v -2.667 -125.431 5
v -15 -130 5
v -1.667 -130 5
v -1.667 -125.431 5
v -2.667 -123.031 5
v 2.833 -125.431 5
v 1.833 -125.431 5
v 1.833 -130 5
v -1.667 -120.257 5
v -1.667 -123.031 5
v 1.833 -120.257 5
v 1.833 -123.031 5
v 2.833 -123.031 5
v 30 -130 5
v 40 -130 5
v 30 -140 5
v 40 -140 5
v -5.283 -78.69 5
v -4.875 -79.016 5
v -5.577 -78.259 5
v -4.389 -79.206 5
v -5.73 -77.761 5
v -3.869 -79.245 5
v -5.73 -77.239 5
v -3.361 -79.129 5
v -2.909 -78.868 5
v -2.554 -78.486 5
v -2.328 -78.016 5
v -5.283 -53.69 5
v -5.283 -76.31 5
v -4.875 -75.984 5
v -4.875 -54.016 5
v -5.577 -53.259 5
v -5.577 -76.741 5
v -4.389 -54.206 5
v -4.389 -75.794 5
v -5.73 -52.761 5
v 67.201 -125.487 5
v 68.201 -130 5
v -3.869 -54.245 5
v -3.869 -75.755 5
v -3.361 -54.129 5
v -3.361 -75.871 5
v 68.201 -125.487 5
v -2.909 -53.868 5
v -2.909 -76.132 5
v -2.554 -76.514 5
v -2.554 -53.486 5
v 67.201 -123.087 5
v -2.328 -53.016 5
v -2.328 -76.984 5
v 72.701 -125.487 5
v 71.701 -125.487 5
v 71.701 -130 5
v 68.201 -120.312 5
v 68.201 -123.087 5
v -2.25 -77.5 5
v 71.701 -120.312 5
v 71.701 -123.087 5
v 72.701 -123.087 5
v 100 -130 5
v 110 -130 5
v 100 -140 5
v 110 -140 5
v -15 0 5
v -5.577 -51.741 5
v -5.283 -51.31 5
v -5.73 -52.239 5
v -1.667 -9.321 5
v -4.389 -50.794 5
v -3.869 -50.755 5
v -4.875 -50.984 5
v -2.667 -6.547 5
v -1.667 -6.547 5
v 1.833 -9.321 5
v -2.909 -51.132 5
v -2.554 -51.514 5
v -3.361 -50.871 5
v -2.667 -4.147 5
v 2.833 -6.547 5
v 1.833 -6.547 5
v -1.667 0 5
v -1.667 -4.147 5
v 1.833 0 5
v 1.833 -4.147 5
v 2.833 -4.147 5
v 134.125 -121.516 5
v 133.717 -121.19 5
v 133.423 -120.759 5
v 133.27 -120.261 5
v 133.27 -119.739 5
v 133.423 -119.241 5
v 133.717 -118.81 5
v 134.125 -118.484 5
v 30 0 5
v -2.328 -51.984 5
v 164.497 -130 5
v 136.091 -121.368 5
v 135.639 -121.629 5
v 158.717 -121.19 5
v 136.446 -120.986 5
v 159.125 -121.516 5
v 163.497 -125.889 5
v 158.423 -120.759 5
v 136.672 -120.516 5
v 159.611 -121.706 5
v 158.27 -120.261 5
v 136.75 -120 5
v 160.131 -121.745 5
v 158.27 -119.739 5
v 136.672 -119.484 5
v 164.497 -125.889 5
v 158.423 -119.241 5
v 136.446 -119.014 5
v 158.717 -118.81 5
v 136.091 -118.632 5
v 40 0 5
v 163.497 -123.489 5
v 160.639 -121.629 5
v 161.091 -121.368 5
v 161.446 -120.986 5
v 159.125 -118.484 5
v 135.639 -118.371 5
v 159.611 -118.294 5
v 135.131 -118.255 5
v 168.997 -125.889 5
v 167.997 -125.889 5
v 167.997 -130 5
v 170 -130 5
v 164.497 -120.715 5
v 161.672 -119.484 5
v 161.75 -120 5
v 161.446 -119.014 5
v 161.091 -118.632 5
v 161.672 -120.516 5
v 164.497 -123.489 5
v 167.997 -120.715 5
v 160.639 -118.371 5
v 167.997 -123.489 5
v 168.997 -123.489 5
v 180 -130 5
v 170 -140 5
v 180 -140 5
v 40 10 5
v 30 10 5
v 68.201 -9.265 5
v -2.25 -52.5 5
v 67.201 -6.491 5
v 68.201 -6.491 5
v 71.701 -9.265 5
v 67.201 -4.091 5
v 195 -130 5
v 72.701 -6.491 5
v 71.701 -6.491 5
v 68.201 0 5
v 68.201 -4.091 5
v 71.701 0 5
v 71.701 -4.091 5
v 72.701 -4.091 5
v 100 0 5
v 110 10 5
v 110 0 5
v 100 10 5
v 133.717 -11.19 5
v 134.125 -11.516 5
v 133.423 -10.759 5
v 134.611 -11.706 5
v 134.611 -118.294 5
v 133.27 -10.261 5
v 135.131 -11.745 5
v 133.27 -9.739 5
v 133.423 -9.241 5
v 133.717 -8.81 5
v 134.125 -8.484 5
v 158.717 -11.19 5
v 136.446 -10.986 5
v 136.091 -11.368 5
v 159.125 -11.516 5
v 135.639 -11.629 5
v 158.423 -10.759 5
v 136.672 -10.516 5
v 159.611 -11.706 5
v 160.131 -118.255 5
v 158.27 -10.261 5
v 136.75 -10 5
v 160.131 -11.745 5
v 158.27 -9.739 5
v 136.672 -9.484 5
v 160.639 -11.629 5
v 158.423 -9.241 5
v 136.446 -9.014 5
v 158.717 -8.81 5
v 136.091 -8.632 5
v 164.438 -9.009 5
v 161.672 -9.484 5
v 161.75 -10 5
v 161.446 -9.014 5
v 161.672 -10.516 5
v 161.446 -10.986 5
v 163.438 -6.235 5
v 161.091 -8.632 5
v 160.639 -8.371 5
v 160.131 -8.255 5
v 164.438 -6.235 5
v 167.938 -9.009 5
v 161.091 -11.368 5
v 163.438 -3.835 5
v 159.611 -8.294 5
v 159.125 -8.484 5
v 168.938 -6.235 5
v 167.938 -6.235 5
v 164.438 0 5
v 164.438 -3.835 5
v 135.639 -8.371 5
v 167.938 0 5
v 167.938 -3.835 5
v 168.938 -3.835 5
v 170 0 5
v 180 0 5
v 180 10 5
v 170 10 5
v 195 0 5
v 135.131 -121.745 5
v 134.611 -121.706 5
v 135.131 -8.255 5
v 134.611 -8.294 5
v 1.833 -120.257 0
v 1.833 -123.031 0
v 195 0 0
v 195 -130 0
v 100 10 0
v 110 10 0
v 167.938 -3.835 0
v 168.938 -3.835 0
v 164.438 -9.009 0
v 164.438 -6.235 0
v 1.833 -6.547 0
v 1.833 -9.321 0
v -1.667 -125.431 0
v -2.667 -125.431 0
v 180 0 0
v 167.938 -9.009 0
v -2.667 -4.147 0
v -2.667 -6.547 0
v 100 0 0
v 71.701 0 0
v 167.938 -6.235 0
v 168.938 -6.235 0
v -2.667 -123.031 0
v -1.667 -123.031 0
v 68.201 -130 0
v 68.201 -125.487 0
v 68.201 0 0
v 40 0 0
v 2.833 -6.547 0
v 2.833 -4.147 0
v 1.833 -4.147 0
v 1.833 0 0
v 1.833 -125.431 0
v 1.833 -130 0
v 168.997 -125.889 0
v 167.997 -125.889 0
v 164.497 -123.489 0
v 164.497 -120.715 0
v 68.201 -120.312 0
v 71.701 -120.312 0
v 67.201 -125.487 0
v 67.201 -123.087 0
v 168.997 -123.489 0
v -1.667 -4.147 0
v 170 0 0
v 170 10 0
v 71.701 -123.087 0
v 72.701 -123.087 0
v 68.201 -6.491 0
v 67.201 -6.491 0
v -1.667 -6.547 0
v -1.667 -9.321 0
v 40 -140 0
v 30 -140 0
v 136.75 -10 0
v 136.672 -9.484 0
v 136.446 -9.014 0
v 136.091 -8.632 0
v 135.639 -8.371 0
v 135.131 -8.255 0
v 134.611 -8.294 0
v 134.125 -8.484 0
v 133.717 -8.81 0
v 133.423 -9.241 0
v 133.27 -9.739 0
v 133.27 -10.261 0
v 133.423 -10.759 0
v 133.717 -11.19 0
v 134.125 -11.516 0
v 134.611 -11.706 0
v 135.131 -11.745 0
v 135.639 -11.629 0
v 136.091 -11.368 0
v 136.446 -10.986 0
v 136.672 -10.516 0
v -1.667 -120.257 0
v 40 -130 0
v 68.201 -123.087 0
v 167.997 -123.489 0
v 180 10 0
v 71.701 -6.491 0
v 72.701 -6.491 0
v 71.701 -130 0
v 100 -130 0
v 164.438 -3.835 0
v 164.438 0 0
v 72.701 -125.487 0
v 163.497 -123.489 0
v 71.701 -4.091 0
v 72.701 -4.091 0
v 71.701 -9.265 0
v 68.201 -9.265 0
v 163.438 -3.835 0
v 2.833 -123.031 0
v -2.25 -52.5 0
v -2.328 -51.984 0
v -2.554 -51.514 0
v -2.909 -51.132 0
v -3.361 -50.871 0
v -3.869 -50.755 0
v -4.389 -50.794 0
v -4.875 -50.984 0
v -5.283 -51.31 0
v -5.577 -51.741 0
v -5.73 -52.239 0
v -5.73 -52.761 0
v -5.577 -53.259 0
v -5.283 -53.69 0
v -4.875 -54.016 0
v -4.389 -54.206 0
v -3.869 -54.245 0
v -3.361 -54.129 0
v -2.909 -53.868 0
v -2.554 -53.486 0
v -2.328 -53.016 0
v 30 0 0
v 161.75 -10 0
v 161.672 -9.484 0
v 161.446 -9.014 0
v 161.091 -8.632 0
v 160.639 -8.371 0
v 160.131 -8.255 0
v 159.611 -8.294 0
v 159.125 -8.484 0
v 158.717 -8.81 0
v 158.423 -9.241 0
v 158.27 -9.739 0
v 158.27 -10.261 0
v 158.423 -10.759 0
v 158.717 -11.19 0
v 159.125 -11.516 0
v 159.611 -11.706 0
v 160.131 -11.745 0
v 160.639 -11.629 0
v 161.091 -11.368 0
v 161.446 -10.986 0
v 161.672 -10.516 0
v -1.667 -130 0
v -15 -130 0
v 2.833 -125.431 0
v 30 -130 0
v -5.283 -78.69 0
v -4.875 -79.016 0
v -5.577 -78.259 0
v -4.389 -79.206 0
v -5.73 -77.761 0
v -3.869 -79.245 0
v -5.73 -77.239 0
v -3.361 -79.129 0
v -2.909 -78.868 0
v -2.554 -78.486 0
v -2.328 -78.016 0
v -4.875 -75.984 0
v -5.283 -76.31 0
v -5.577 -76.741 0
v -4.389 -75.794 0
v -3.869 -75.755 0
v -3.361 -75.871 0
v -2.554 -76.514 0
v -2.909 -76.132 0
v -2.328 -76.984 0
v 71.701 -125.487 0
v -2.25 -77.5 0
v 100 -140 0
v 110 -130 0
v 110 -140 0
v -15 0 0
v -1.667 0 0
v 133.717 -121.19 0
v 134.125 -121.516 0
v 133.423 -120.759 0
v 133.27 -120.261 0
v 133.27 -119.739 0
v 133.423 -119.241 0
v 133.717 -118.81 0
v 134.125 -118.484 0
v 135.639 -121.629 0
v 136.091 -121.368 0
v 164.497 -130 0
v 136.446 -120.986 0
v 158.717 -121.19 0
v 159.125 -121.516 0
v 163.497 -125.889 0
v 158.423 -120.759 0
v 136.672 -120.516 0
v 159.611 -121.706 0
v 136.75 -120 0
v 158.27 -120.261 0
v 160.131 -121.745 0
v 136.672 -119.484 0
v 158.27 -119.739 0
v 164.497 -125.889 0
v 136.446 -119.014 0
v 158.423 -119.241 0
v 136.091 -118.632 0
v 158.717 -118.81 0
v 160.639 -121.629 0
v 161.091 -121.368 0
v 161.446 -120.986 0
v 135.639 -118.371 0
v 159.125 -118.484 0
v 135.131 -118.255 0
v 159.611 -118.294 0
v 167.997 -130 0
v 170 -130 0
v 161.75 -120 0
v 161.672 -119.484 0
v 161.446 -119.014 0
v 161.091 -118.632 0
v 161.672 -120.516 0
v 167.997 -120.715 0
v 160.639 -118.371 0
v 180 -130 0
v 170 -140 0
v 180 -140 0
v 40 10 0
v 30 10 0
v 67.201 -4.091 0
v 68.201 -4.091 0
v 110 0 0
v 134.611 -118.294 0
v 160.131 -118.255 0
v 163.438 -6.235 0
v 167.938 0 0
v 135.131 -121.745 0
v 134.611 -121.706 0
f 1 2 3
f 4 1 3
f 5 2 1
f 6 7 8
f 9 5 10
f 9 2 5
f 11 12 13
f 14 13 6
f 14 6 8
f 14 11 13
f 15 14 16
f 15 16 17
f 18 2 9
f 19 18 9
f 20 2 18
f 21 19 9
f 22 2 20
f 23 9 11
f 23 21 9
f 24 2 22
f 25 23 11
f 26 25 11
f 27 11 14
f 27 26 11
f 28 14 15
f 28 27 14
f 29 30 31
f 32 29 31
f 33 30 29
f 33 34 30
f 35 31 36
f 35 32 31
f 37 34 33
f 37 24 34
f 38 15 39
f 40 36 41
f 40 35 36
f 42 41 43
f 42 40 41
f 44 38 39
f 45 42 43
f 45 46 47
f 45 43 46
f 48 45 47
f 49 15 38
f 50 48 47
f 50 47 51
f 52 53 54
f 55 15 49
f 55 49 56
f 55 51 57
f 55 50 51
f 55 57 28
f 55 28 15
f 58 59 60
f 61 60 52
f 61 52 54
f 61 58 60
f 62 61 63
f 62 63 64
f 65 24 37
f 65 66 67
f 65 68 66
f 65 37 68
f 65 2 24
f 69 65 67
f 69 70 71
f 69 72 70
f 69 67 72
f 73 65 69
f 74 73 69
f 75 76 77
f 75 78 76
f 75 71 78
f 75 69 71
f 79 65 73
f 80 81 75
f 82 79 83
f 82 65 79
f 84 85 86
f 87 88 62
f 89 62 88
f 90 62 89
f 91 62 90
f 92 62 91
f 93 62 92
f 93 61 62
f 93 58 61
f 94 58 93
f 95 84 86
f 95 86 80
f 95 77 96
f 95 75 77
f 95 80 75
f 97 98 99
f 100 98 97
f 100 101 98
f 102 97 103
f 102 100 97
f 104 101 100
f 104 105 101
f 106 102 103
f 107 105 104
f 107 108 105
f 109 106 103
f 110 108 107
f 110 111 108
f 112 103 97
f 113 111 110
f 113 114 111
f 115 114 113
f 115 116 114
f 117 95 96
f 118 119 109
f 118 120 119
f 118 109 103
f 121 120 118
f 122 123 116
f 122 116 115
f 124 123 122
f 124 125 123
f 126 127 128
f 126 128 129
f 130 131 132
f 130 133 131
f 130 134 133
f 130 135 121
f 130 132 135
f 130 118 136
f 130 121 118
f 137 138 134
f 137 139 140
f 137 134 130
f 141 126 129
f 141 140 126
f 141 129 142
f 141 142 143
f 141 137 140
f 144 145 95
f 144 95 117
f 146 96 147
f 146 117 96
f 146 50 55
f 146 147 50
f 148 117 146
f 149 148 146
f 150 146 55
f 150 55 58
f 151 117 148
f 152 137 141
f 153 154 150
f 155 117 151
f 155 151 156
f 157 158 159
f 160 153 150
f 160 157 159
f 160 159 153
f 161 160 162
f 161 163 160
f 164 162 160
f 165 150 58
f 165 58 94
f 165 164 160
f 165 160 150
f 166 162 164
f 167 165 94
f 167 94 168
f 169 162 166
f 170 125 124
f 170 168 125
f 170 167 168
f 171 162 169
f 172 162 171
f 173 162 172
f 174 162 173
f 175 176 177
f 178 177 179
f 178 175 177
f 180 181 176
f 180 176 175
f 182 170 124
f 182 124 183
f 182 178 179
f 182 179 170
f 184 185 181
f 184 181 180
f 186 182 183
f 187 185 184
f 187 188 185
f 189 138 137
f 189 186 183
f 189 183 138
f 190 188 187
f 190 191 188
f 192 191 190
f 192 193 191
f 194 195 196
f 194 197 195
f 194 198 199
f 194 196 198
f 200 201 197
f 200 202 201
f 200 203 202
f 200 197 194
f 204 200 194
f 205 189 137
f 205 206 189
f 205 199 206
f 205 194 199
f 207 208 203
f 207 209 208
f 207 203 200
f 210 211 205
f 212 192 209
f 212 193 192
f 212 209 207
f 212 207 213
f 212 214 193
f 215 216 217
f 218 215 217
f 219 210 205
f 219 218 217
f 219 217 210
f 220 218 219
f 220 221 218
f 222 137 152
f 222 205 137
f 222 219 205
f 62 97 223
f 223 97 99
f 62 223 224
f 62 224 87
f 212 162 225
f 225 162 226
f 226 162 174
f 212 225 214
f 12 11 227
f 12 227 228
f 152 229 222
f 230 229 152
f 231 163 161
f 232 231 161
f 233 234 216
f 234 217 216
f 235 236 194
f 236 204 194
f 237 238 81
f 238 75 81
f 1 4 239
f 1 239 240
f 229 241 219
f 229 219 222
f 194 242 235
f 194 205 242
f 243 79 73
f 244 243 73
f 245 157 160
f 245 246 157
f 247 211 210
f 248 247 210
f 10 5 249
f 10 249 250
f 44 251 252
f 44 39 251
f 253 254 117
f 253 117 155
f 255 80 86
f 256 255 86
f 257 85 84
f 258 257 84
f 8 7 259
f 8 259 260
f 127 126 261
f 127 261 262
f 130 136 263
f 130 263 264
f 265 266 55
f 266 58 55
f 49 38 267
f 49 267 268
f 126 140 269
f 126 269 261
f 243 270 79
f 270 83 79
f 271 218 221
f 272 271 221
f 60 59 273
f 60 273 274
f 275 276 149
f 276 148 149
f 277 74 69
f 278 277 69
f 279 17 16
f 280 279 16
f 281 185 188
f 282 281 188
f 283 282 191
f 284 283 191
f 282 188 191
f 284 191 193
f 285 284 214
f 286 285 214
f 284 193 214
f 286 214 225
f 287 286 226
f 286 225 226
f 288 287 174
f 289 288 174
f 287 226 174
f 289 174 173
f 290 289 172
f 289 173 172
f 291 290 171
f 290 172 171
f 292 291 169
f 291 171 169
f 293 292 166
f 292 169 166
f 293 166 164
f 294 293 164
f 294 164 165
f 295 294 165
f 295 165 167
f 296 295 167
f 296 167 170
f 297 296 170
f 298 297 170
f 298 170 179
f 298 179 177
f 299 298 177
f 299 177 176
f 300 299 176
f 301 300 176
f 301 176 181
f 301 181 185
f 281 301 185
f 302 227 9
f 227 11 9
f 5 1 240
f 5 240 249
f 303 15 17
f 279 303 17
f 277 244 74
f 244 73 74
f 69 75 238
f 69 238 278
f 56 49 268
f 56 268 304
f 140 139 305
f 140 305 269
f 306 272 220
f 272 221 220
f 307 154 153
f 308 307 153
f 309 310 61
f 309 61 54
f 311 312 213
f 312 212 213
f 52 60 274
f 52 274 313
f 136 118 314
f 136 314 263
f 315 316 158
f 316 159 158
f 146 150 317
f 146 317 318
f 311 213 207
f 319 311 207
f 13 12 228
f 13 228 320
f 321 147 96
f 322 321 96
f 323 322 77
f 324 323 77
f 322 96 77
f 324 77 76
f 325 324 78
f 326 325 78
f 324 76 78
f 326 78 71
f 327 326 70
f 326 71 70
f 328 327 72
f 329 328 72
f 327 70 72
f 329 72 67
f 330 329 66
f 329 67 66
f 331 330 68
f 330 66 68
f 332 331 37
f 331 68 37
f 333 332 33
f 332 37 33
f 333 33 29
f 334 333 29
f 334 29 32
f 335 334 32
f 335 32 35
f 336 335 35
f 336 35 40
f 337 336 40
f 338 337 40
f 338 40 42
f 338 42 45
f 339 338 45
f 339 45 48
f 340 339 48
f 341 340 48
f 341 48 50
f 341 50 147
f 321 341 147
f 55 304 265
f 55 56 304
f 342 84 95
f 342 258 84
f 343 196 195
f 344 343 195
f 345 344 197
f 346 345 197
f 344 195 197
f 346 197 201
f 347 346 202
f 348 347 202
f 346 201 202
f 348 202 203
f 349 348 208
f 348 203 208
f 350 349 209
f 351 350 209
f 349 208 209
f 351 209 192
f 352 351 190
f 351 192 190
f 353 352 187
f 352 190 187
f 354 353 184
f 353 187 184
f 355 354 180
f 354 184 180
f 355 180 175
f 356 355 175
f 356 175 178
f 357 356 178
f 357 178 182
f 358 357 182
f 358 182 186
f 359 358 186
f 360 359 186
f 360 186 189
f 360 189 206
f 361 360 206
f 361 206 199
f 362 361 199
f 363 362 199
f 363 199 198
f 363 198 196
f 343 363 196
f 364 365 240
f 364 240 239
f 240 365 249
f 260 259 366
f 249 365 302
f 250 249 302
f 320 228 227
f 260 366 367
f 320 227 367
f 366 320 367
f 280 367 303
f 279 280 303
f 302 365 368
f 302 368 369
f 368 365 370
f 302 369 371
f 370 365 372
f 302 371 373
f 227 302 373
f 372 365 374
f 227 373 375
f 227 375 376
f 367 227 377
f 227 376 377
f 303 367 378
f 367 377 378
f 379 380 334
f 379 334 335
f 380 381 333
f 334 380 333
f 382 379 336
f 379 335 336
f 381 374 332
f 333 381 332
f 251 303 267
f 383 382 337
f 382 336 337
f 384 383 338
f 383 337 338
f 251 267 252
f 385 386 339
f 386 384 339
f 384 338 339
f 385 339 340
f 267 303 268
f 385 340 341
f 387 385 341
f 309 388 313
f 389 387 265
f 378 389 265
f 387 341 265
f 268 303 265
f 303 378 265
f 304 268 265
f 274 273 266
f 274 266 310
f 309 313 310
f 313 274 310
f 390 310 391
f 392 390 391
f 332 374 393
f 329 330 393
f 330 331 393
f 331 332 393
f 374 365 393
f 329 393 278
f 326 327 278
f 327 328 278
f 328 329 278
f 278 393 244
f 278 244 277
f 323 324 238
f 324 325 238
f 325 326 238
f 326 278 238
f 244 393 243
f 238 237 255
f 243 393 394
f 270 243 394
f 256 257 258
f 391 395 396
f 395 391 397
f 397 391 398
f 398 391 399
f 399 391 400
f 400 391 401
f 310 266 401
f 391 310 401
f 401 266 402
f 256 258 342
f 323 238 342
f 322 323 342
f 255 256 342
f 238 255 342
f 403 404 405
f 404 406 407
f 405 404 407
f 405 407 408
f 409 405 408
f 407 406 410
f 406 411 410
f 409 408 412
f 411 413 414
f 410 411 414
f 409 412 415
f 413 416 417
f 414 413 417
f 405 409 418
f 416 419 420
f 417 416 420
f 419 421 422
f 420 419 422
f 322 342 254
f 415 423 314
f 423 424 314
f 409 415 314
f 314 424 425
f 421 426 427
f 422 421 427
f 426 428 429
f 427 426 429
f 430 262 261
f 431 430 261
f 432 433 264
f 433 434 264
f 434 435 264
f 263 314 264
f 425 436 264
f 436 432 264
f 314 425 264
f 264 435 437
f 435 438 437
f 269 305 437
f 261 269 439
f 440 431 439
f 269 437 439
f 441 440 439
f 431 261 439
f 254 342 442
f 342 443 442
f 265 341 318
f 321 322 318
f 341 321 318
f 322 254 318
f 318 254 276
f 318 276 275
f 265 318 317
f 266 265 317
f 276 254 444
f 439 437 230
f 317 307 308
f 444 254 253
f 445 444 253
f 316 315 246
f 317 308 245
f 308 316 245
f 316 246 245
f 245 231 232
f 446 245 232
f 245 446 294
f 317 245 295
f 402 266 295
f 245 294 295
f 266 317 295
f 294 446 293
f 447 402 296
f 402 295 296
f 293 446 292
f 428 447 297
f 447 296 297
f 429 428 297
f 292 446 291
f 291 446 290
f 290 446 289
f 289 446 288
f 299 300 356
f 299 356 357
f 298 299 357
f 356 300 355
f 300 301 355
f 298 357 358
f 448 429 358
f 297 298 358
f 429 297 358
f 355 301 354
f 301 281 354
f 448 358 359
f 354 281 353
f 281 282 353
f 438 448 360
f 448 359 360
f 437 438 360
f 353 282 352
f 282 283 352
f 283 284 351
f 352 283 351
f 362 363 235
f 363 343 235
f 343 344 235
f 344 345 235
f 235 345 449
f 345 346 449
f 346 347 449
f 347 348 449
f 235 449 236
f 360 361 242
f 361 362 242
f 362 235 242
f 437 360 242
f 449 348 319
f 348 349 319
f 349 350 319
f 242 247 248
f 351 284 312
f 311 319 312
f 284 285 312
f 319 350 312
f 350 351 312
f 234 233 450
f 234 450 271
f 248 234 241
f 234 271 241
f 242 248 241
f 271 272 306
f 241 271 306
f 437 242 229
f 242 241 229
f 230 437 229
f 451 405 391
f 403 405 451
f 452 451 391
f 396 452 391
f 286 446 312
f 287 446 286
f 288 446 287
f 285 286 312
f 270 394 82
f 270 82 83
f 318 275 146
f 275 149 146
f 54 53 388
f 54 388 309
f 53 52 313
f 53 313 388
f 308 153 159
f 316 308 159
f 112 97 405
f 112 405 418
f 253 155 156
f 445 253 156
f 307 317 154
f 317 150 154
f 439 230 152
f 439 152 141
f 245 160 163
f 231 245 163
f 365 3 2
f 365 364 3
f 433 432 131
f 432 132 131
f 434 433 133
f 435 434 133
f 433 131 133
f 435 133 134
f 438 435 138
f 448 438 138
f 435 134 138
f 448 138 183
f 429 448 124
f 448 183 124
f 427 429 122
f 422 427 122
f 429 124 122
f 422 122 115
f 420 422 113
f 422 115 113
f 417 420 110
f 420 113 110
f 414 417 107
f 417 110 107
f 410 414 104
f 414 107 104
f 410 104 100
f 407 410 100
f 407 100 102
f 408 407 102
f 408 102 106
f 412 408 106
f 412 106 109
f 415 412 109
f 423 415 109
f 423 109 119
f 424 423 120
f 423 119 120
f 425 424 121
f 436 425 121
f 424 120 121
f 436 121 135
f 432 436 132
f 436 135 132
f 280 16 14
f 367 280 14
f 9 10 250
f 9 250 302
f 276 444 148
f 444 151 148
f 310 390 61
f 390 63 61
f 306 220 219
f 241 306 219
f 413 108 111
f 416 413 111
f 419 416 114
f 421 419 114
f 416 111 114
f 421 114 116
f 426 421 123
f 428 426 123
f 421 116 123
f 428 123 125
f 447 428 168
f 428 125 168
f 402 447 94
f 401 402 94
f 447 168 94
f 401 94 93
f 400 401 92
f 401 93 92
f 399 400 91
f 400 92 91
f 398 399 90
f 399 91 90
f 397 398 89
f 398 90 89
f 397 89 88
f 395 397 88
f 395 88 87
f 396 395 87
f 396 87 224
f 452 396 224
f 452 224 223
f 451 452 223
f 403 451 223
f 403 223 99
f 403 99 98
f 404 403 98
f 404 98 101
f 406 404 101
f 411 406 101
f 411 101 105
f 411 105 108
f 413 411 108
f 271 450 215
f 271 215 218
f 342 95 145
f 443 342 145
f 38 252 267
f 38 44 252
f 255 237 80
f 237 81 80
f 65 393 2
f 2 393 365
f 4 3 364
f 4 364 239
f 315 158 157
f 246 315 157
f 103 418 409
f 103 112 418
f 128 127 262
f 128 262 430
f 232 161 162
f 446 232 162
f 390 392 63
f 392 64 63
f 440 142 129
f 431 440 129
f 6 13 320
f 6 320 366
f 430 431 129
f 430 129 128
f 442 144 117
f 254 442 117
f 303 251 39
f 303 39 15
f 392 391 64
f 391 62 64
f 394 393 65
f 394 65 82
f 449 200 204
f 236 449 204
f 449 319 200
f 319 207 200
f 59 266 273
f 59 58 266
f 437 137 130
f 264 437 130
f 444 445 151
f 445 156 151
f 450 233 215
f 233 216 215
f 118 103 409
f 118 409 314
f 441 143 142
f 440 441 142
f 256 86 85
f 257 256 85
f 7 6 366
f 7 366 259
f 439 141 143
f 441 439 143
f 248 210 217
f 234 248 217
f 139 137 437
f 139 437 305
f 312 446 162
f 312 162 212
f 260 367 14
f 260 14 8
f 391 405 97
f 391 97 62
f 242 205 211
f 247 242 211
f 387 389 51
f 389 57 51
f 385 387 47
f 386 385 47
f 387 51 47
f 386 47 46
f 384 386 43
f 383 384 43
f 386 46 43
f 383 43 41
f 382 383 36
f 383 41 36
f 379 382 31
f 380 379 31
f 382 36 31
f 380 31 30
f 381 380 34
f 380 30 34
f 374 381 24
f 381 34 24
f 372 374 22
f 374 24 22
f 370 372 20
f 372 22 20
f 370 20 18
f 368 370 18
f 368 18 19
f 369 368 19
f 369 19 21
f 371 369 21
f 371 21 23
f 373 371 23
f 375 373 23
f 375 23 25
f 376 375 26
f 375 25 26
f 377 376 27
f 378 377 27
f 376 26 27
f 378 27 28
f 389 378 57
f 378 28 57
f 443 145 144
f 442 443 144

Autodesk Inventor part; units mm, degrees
ref_plane "YZ Plane" through (0, 0, 0) normal (1, 0, 0) x (0, 1, 0)
ref_plane "XZ Plane" through (0, 0, 0) normal (0, 1, 0) x (-1, 0, 0)
ref_plane "XY Plane" through (0, 0, 0) normal (0, 0, 1) x (1, 0, 0)
sketch "Boceto1" plane through (0, 0, 0) normal (0, 0, 1) x (1, 0, 0)
  line L0 (0, 0) -> (195, 0)
  line L1 (195, 0) -> (195, -130)
  line L2 (195, -130) -> (0, -130)
  line L3 (-15, 0) -> (-15, -130)
  line L4 (0, -130) -> (-15, -130)
  line L5 (0, 0) -> (-15, 0)
  dimension "d1" = 130
extrude "Extrusión1" add sketch "Boceto1" along normal blind 5
sketch "Boceto2" plane through (0, 0, 5) normal (0, 0, 1) x (1, 0, 0)
  line L0 (-15, 0) -> (195, 0) projected
  line L1 (195, -130) -> (-15, -130) projected
  line L2 (30, 0) -> (40, 0)
  line L3 (100, 0) -> (110, 0)
  line L4 (170, 0) -> (180, 0)
  line L5 (170, -130) -> (180, -130)
  line L6 (100, -130) -> (110, -130)
  line L7 (30, -130) -> (40, -130)
  line L8 (40, 5) -> (40, 0)
  line L9 (40, -130) -> (40, -135)
  line L10 (30, -135) -> (30, -130)
  line L11 (30, 0) -> (30, 5)
  line L12 (110, 5) -> (110, 0)
  line L13 (110, -130) -> (110, -135)
  line L14 (100, -135) -> (100, -130)
  line L15 (100, 0) -> (100, 5)
  line L16 (180, 5) -> (180, 0)
  line L17 (180, -130) -> (180, -135)
  line L18 (170, -135) -> (170, -130)
  line L19 (170, 0) -> (170, 5)
  line L20 (30, 5) -> (30, 10)
  line L21 (40, 10) -> (40, 5)
  line L22 (100, 5) -> (100, 10)
  line L23 (110, 10) -> (110, 5)
  line L24 (170, 5) -> (170, 10)
  line L25 (180, 10) -> (180, 5)
  line L26 (40, -135) -> (40, -140)
  line L27 (30, -140) -> (30, -135)
  line L28 (110, -135) -> (110, -140)
  line L29 (100, -140) -> (100, -135)
  line L30 (180, -135) -> (180, -140)
  line L31 (170, -140) -> (170, -135)
  line L32 (170, 10) -> (180, 10)
  line L33 (30, 10) -> (40, 10)
  line L34 (100, 10) -> (110, 10)
  line L35 (180, -140) -> (170, -140)
  line L36 (110, -140) -> (100, -140)
  line L37 (40, -140) -> (30, -140)
extrude "Extrusión2" add sketch "Boceto2" against normal blind 5
sketch "Boceto3" plane through (0, 0, 5) normal (0, 0, 1) x (1, 0, 0)
  line L0 (195, 0) -> (195, -130) projected
  line L1 (180, 0) -> (195, 0) projected
  line L2 (-15, -130) -> (-15, 0) projected
  circle A0 centre (135, -120) radius 1.75
  circle A1 centre (160, -120) radius 1.75
  circle A2 centre (135, -10) radius 1.75
  circle A3 centre (160, -10) radius 1.75
  circle A4 centre (-4, -52.5) radius 1.75
  circle A5 centre (-4, -77.5) radius 1.75
  point P0 (30, 0)
  point P1 (30, -130)
  point P2 (0, 0)
  dimension "d20" = 3.5
  dimension "d21" = 3.5
  dimension "d22" = 3.5
  dimension "d23" = 3.5
  dimension "d24" = 3.5
  dimension "d25" = 3.5
  dimension "d26" = 25
  dimension "d27" = 25
  dimension "d28" = 25
  dimension "d29" = 10
  dimension "d30" = 10
  dimension "d31" = 150
  dimension "d32" = 150
  dimension "d33" = 52.5
  dimension "d34" = 199
extrude "Extrusión3" cut sketch "Boceto3" against normal blind 10
sketch "Boceto4" plane through (0, 0, 5) normal (0, 0, 1) x (1, 0, 0)
  line L0 (-1.6674, -130.3426) -> (-1.6674, -125.4313)
  line L1 (1.8326, -130.3426) -> (-1.6674, -130.3426)
  line L2 (1.8326, -125.4313) -> (1.8326, -130.3426)
  line L3 (-1.6674, -125.4313) -> (-2.6674, -125.4313)
  line L4 (-2.6674, -123.0313) -> (-1.6674, -123.0313)
  line L5 (-1.6674, -123.0313) -> (-1.6674, -120.2573)
  line L6 (1.8326, -120.2573) -> (1.8326, -123.0313)
  line L7 (2.8326, -125.4313) -> (1.8326, -125.4313)
  line L8 (2.8326, -123.0313) -> (2.8326, -125.4313)
  line L9 (1.8326, -123.0313) -> (2.8326, -123.0313)
  line L10 (1.8326, -120.2573) -> (-1.6674, -120.2573)
  line L11 (-2.6674, -125.4313) -> (-2.6674, -123.0313)
  line L12 (167.9972, -120.715) -> (164.4972, -120.715)
  line L13 (167.9972, -120.715) -> (167.9972, -123.4891)
  line L14 (164.4972, -123.4891) -> (164.4972, -120.715)
  line L15 (167.9972, -123.4891) -> (168.9972, -123.4891)
  line L16 (168.9972, -123.4891) -> (168.9972, -125.8891)
  line L17 (163.4972, -125.8891) -> (163.4972, -123.4891)
  line L18 (164.4972, -125.8891) -> (163.4972, -125.8891)
  line L19 (168.9972, -125.8891) -> (167.9972, -125.8891)
  line L20 (163.4972, -123.4891) -> (164.4972, -123.4891)
  line L21 (164.4972, -130.8004) -> (164.4972, -125.8891)
  line L22 (167.9972, -130.8004) -> (164.4972, -130.8004)
  line L23 (167.9972, -125.8891) -> (167.9972, -130.8004)
  line L24 (71.7006, -120.3125) -> (68.2006, -120.3125)
  line L25 (71.7006, -120.3125) -> (71.7006, -123.0866)
  line L26 (68.2006, -123.0866) -> (68.2006, -120.3125)
  line L27 (71.7006, -123.0866) -> (72.7006, -123.0866)
  line L28 (72.7006, -123.0866) -> (72.7006, -125.4866)
  line L29 (67.2006, -125.4866) -> (67.2006, -123.0866)
  line L30 (68.2006, -125.4866) -> (67.2006, -125.4866)
  line L31 (72.7006, -125.4866) -> (71.7006, -125.4866)
  line L32 (67.2006, -123.0866) -> (68.2006, -123.0866)
  line L33 (68.2006, -130.3979) -> (68.2006, -125.4866)
  line L34 (71.7006, -130.3979) -> (68.2006, -130.3979)
  line L35 (71.7006, -125.4866) -> (71.7006, -130.3979)
  line L36 (1.8326, -9.3206) -> (-1.6674, -9.3206)
  line L37 (1.8326, -9.3206) -> (1.8326, -6.5466)
  line L38 (-1.6674, -6.5466) -> (-1.6674, -9.3206)
  line L39 (1.8326, -6.5466) -> (2.8326, -6.5466)
  line L40 (2.8326, -6.5466) -> (2.8326, -4.1466)
  line L41 (-2.6674, -4.1466) -> (-2.6674, -6.5466)
  line L42 (-1.6674, -4.1466) -> (-2.6674, -4.1466)
  line L43 (2.8326, -4.1466) -> (1.8326, -4.1466)
  line L44 (-2.6674, -6.5466) -> (-1.6674, -6.5466)
  line L45 (-1.6674, 0.7647) -> (-1.6674, -4.1466)
  line L46 (1.8326, 0.7647) -> (-1.6674, 0.7647)
  line L47 (1.8326, -4.1466) -> (1.8326, 0.7647)
  line L48 (168.9375, -3.8347) -> (167.9375, -3.8347)
  line L49 (167.9375, -3.8347) -> (167.9375, 1.0766)
  line L50 (167.9375, 1.0766) -> (164.4375, 1.0766)
  line L51 (167.9375, -6.2347) -> (168.9375, -6.2347)
  line L52 (167.9375, -9.0087) -> (167.9375, -6.2347)
  line L53 (164.4375, 1.0766) -> (164.4375, -3.8347)
  line L54 (164.4375, -3.8347) -> (163.4375, -3.8347)
  line L55 (163.4375, -3.8347) -> (163.4375, -6.2347)
  line L56 (163.4375, -6.2347) -> (164.4375, -6.2347)
  line L57 (164.4375, -6.2347) -> (164.4375, -9.0087)
  line L58 (167.9375, -9.0087) -> (164.4375, -9.0087)
  line L59 (168.9375, -6.2347) -> (168.9375, -3.8347)
  line L60 (72.7006, -6.4914) -> (72.7006, -4.0914)
  line L61 (72.7006, -4.0914) -> (71.7006, -4.0914)
  line L62 (71.7006, -6.4914) -> (72.7006, -6.4914)
  line L63 (71.7006, -4.0914) -> (71.7006, 0.8199)
  line L64 (71.7006, -9.2654) -> (71.7006, -6.4914)
  line L65 (71.7006, 0.8199) -> (68.2006, 0.8199)
  line L66 (68.2006, 0.8199) -> (68.2006, -4.0914)
  line L67 (71.7006, -9.2654) -> (68.2006, -9.2654)
  line L68 (68.2006, -6.4914) -> (68.2006, -9.2654)
  line L69 (68.2006, -4.0914) -> (67.2006, -4.0914)
  line L70 (67.2006, -4.0914) -> (67.2006, -6.4914)
  line L71 (67.2006, -6.4914) -> (68.2006, -6.4914)
  line L72 (170, 10) -> (170, 0) projected
  point P0 (0, 0)
  dimension "d37" = 3.5
  dimension "d38" = 3.5
  dimension "d39" = 3.5
  dimension "d45" = 2.0625
extrude "Extrusión4" cut sketch "Boceto4" against normal blind 10
properties part number "pieza central base superior"
